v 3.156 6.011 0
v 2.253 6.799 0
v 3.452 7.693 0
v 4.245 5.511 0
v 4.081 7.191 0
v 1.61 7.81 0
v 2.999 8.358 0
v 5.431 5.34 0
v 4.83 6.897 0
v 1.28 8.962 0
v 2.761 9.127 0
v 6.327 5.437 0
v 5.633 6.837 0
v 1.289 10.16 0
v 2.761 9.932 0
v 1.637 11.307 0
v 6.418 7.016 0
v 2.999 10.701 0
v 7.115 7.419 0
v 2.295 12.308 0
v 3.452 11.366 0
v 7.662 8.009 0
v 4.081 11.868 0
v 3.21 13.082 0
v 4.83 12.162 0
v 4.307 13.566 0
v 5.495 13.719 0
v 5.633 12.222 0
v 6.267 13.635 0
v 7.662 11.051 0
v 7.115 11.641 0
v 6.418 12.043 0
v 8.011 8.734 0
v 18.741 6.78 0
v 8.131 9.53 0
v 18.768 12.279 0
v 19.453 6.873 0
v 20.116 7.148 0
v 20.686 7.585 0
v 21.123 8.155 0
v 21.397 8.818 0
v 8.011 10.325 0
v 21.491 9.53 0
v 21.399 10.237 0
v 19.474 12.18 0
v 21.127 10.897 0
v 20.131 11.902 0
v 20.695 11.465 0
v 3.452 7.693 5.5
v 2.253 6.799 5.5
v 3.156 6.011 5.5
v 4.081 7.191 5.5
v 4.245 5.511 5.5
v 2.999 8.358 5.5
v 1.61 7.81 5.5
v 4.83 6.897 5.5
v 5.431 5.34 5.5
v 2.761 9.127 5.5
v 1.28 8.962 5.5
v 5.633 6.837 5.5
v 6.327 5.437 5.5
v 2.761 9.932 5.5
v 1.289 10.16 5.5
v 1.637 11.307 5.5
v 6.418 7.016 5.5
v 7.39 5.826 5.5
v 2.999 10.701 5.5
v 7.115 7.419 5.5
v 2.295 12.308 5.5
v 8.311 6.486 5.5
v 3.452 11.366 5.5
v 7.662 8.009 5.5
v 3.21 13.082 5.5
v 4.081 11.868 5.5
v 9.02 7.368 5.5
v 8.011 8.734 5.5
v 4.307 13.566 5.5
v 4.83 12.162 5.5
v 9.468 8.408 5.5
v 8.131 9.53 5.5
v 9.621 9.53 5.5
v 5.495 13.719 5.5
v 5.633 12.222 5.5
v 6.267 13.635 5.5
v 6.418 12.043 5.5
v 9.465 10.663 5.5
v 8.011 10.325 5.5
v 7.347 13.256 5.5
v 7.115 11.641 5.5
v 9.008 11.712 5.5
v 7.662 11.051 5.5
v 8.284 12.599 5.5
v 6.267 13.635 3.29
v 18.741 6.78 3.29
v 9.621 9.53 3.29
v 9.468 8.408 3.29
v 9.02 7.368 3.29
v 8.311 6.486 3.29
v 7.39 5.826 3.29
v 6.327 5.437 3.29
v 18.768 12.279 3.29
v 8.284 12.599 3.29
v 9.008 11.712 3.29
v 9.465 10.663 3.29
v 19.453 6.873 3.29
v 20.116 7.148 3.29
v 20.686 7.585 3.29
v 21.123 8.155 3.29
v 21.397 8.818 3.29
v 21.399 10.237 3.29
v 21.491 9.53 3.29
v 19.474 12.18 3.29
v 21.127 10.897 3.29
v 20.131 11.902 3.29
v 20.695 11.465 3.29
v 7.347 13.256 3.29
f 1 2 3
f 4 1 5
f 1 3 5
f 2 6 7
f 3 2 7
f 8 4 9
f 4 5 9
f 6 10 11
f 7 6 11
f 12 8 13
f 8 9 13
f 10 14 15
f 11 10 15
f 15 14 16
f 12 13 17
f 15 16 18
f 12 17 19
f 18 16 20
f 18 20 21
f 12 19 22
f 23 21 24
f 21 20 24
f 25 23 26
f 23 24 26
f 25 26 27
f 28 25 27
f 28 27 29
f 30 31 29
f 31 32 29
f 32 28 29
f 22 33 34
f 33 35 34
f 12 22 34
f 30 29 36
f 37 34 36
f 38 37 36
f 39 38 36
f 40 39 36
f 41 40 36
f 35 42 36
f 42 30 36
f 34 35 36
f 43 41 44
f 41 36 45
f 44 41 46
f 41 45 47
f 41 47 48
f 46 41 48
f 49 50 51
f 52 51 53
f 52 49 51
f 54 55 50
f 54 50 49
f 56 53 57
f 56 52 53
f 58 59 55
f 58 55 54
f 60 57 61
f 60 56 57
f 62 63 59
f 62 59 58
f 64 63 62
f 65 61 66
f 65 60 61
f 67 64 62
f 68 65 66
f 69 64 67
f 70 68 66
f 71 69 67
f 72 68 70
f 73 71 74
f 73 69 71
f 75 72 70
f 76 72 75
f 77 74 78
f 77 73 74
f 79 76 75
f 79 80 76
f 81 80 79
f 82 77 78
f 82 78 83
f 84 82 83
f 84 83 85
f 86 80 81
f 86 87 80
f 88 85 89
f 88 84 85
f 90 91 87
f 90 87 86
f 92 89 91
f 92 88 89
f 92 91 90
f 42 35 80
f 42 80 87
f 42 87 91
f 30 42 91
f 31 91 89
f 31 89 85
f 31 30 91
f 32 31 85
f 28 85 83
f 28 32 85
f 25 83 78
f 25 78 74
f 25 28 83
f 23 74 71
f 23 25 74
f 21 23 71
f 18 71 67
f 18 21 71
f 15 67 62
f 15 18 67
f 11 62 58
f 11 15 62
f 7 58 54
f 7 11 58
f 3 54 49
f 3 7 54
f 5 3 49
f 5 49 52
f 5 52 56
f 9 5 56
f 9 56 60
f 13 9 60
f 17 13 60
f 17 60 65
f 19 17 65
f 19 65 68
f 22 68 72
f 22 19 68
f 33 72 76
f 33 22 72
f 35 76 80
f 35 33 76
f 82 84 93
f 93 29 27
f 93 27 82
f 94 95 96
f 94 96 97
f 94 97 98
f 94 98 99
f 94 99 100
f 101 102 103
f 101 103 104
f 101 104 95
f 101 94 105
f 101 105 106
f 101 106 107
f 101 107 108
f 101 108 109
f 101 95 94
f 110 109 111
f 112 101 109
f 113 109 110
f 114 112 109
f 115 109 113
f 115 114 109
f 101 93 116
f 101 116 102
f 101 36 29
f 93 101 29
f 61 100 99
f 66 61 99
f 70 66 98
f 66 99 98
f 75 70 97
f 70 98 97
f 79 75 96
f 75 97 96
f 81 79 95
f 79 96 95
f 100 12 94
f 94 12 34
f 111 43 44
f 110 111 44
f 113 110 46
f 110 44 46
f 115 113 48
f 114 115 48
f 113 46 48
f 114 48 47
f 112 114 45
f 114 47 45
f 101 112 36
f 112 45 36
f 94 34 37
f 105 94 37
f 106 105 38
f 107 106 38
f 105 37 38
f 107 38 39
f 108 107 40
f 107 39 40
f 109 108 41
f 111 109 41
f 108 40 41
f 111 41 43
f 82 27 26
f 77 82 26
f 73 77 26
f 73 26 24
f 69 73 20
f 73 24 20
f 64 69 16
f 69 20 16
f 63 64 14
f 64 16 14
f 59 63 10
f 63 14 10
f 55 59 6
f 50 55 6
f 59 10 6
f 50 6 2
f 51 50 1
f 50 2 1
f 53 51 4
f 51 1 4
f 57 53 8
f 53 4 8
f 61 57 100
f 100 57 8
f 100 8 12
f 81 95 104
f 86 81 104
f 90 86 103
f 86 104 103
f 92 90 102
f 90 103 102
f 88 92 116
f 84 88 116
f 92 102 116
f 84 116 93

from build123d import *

# Parameters (mm, degrees)
F1_DEPTH = 3.29
F0_R     = 2.7
F2_DEPTH = 5.5


with BuildPart() as f1:
    # F0 (on Top) → F1 (new body)
    with BuildSketch(Plane.XY):
        with BuildLine():
            Line((18.7677565455, 12.2794405385), (6.2668947811, 13.6353748107))
            ThreePointArc((6.2668947811, 13.6353748107), (8.675985762, 12.1804513231), (9.621155417, 9.5295691997))
            ThreePointArc((9.621155417, 9.5295691997), (8.6954252879, 6.9026618527), (6.3272927871, 5.4365217026))
            Line((6.3272927871, 5.4365217026), (18.741155417, 6.7795691997))
            ThreePointArc((18.741155417, 6.7795691997), (15.9911875825, 9.5428699196), (18.7677565455, 12.2794405385))
        make_face()
        with BuildLine():
            ThreePointArc((21.491155417, 9.5295691997), (20.69508135, 11.4646850744), (18.7677565455, 12.2794405385))
            ThreePointArc((18.7677565455, 12.2794405385), (15.9911875825, 9.5428699196), (18.741155417, 6.7795691997))
            ThreePointArc((18.741155417, 6.7795691997), (20.6856990652, 7.5850255515), (21.491155417, 9.5295691997))
        make_face()
    extrude(amount=F1_DEPTH)

    # F0 (on Top) → F2 (join)
    with BuildSketch(Plane.XY):
        with BuildLine():
            Line((6.2668947811, 13.6353748107), (5.4951863181, 13.7190799162))
            ThreePointArc((5.4951863181, 13.7190799162), (1.2412777396, 9.561585585), (5.431155417, 5.3395691997))
            Line((5.431155417, 5.3395691997), (6.3272927871, 5.4365217026))
            ThreePointArc((6.3272927871, 5.4365217026), (8.6954252879, 6.9026618527), (9.621155417, 9.5295691997))
            ThreePointArc((9.621155417, 9.5295691997), (8.675985762, 12.1804513231), (6.2668947811, 13.6353748107))
        make_face()
        with Locations((5.431155417, 9.5295691997)):
            Circle(F0_R, mode=Mode.SUBTRACT)
    extrude(amount=F2_DEPTH)


solid = f1.part
